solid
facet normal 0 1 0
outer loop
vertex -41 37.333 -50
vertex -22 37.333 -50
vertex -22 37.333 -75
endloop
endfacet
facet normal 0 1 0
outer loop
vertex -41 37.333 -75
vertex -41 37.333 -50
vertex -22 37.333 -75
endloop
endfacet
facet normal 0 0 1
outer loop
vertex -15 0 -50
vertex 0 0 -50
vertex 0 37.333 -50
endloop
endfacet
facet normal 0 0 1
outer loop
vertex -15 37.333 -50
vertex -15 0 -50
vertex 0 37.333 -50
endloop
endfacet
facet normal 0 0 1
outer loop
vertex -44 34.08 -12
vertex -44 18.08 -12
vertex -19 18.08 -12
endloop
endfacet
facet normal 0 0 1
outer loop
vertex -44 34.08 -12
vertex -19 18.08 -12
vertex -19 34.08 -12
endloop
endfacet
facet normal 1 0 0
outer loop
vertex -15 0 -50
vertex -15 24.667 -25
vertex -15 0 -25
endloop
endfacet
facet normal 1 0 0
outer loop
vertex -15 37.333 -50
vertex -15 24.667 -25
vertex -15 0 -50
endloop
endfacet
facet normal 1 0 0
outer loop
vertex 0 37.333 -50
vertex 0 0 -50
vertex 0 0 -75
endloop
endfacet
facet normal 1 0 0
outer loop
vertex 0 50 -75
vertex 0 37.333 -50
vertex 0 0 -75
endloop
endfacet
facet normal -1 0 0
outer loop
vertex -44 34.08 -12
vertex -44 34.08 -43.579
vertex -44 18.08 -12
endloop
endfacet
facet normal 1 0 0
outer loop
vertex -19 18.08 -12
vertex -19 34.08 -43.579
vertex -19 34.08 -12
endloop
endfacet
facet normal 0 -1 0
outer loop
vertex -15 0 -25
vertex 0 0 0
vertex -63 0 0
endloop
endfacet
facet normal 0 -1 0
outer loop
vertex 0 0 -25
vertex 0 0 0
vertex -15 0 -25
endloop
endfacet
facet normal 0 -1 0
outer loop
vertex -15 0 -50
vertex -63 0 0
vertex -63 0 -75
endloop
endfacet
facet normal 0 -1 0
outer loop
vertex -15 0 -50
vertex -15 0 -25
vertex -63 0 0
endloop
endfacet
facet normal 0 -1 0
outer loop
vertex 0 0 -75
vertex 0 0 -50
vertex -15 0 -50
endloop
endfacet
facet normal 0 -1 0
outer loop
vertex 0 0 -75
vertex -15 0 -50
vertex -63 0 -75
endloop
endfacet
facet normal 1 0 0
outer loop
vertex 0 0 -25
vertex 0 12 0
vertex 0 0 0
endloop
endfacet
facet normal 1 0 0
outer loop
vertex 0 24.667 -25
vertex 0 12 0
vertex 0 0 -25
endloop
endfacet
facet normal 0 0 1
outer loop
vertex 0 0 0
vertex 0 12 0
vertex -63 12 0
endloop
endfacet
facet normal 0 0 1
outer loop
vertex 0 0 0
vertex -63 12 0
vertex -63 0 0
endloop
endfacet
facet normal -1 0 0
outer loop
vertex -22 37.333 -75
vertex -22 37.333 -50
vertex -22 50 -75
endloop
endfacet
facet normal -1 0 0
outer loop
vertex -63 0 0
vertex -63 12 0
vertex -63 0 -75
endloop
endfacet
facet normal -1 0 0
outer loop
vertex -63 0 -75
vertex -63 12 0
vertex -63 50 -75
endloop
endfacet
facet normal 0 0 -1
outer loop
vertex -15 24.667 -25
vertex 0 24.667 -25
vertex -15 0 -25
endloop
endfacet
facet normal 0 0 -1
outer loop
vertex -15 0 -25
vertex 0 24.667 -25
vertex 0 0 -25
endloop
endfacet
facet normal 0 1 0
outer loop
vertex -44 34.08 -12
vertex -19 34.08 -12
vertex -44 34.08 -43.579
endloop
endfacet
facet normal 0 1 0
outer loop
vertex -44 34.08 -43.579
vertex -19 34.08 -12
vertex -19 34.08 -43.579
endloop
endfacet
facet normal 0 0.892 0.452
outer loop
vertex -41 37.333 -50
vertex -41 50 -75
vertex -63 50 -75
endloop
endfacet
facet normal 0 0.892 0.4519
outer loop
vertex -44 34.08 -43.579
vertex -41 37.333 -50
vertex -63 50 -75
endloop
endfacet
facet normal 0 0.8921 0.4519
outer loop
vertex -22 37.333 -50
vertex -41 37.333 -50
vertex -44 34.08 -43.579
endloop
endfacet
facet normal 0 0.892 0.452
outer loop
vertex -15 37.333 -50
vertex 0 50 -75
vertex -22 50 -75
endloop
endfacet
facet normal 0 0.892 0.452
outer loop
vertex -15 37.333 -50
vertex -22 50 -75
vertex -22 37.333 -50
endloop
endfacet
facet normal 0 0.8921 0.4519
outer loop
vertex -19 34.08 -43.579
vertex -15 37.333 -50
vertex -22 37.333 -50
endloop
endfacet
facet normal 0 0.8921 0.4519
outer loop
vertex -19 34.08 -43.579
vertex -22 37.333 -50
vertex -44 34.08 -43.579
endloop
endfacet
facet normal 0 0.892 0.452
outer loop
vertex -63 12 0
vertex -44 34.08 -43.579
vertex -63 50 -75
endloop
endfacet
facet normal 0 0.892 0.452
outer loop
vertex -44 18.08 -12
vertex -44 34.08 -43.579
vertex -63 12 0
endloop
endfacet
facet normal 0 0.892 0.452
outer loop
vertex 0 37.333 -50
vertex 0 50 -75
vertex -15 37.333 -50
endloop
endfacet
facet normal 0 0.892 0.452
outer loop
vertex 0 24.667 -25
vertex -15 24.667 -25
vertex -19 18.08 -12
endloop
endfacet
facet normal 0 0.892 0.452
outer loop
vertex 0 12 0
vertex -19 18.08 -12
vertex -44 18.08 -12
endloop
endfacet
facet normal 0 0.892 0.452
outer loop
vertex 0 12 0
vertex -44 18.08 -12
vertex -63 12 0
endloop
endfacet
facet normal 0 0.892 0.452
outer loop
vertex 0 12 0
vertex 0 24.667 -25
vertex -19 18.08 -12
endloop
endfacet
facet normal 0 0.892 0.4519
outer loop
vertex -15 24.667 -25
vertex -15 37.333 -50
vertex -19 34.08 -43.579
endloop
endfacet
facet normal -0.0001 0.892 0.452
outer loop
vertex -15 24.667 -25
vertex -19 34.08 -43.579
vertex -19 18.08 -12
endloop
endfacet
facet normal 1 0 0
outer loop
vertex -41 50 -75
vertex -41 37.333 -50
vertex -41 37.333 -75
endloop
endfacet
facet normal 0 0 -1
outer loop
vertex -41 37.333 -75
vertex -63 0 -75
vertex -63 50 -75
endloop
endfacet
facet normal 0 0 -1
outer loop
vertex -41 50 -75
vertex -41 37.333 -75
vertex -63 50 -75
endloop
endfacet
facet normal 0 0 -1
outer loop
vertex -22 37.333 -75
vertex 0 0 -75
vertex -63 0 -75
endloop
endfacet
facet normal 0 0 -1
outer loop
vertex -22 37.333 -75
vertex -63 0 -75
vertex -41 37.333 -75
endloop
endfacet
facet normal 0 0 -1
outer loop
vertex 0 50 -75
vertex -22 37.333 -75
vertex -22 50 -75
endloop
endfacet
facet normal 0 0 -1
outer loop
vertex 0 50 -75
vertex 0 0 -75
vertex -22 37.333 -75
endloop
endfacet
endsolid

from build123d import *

# Parameters (mm, degrees)
BOSS_EXTRUDE1_DEPTH = 63
CUT_EXTRUDE1_DEPTH  = 15
BOSS_EXTRUDE2_DEPTH = 25
CUT_EXTRUDE2_DEPTH  = 19


with BuildPart() as part:
    # Sketch1 → Boss-Extrude1 (new body)
    with BuildSketch(Plane(origin=(0, 0, 0), x_dir=(0, 0, -1), z_dir=(1, 0, 0))):
        Polygon((75, 0), (75, 50), (0, 12), (0, 0), align=None)
    extrude(amount=-BOSS_EXTRUDE1_DEPTH)

    # Sketch2 → Cut-Extrude1 (cut)
    with BuildSketch(Plane(origin=(0, 0, 0), x_dir=(0, 0, -1), z_dir=(1, 0, 0))):
        Polygon((50, 0), (50, 37.333333333), (25, 24.666666667), (25, 0), align=None)
    extrude(amount=-CUT_EXTRUDE1_DEPTH, mode=Mode.SUBTRACT)

    # Sketch4 → Boss-Extrude2 (add)
    with BuildSketch(Plane(origin=(-19, 0, 0), x_dir=(0, 0, -1), z_dir=(1, 0, 0))):
        Polygon((12, 18.08), (12, 34.08), (43.578947368, 34.08), align=None)
    extrude(amount=-BOSS_EXTRUDE2_DEPTH)

    # Sketch5 → Cut-Extrude2 (cut)
    with BuildSketch(Plane(origin=(-22, 0, 0), x_dir=(0, 0, -1), z_dir=(1, 0, 0))):
        Polygon((75, 50), (50, 37.333333333), (75, 37.333333333), align=None)
    extrude(amount=-CUT_EXTRUDE2_DEPTH, mode=Mode.SUBTRACT)


solid = part.part
